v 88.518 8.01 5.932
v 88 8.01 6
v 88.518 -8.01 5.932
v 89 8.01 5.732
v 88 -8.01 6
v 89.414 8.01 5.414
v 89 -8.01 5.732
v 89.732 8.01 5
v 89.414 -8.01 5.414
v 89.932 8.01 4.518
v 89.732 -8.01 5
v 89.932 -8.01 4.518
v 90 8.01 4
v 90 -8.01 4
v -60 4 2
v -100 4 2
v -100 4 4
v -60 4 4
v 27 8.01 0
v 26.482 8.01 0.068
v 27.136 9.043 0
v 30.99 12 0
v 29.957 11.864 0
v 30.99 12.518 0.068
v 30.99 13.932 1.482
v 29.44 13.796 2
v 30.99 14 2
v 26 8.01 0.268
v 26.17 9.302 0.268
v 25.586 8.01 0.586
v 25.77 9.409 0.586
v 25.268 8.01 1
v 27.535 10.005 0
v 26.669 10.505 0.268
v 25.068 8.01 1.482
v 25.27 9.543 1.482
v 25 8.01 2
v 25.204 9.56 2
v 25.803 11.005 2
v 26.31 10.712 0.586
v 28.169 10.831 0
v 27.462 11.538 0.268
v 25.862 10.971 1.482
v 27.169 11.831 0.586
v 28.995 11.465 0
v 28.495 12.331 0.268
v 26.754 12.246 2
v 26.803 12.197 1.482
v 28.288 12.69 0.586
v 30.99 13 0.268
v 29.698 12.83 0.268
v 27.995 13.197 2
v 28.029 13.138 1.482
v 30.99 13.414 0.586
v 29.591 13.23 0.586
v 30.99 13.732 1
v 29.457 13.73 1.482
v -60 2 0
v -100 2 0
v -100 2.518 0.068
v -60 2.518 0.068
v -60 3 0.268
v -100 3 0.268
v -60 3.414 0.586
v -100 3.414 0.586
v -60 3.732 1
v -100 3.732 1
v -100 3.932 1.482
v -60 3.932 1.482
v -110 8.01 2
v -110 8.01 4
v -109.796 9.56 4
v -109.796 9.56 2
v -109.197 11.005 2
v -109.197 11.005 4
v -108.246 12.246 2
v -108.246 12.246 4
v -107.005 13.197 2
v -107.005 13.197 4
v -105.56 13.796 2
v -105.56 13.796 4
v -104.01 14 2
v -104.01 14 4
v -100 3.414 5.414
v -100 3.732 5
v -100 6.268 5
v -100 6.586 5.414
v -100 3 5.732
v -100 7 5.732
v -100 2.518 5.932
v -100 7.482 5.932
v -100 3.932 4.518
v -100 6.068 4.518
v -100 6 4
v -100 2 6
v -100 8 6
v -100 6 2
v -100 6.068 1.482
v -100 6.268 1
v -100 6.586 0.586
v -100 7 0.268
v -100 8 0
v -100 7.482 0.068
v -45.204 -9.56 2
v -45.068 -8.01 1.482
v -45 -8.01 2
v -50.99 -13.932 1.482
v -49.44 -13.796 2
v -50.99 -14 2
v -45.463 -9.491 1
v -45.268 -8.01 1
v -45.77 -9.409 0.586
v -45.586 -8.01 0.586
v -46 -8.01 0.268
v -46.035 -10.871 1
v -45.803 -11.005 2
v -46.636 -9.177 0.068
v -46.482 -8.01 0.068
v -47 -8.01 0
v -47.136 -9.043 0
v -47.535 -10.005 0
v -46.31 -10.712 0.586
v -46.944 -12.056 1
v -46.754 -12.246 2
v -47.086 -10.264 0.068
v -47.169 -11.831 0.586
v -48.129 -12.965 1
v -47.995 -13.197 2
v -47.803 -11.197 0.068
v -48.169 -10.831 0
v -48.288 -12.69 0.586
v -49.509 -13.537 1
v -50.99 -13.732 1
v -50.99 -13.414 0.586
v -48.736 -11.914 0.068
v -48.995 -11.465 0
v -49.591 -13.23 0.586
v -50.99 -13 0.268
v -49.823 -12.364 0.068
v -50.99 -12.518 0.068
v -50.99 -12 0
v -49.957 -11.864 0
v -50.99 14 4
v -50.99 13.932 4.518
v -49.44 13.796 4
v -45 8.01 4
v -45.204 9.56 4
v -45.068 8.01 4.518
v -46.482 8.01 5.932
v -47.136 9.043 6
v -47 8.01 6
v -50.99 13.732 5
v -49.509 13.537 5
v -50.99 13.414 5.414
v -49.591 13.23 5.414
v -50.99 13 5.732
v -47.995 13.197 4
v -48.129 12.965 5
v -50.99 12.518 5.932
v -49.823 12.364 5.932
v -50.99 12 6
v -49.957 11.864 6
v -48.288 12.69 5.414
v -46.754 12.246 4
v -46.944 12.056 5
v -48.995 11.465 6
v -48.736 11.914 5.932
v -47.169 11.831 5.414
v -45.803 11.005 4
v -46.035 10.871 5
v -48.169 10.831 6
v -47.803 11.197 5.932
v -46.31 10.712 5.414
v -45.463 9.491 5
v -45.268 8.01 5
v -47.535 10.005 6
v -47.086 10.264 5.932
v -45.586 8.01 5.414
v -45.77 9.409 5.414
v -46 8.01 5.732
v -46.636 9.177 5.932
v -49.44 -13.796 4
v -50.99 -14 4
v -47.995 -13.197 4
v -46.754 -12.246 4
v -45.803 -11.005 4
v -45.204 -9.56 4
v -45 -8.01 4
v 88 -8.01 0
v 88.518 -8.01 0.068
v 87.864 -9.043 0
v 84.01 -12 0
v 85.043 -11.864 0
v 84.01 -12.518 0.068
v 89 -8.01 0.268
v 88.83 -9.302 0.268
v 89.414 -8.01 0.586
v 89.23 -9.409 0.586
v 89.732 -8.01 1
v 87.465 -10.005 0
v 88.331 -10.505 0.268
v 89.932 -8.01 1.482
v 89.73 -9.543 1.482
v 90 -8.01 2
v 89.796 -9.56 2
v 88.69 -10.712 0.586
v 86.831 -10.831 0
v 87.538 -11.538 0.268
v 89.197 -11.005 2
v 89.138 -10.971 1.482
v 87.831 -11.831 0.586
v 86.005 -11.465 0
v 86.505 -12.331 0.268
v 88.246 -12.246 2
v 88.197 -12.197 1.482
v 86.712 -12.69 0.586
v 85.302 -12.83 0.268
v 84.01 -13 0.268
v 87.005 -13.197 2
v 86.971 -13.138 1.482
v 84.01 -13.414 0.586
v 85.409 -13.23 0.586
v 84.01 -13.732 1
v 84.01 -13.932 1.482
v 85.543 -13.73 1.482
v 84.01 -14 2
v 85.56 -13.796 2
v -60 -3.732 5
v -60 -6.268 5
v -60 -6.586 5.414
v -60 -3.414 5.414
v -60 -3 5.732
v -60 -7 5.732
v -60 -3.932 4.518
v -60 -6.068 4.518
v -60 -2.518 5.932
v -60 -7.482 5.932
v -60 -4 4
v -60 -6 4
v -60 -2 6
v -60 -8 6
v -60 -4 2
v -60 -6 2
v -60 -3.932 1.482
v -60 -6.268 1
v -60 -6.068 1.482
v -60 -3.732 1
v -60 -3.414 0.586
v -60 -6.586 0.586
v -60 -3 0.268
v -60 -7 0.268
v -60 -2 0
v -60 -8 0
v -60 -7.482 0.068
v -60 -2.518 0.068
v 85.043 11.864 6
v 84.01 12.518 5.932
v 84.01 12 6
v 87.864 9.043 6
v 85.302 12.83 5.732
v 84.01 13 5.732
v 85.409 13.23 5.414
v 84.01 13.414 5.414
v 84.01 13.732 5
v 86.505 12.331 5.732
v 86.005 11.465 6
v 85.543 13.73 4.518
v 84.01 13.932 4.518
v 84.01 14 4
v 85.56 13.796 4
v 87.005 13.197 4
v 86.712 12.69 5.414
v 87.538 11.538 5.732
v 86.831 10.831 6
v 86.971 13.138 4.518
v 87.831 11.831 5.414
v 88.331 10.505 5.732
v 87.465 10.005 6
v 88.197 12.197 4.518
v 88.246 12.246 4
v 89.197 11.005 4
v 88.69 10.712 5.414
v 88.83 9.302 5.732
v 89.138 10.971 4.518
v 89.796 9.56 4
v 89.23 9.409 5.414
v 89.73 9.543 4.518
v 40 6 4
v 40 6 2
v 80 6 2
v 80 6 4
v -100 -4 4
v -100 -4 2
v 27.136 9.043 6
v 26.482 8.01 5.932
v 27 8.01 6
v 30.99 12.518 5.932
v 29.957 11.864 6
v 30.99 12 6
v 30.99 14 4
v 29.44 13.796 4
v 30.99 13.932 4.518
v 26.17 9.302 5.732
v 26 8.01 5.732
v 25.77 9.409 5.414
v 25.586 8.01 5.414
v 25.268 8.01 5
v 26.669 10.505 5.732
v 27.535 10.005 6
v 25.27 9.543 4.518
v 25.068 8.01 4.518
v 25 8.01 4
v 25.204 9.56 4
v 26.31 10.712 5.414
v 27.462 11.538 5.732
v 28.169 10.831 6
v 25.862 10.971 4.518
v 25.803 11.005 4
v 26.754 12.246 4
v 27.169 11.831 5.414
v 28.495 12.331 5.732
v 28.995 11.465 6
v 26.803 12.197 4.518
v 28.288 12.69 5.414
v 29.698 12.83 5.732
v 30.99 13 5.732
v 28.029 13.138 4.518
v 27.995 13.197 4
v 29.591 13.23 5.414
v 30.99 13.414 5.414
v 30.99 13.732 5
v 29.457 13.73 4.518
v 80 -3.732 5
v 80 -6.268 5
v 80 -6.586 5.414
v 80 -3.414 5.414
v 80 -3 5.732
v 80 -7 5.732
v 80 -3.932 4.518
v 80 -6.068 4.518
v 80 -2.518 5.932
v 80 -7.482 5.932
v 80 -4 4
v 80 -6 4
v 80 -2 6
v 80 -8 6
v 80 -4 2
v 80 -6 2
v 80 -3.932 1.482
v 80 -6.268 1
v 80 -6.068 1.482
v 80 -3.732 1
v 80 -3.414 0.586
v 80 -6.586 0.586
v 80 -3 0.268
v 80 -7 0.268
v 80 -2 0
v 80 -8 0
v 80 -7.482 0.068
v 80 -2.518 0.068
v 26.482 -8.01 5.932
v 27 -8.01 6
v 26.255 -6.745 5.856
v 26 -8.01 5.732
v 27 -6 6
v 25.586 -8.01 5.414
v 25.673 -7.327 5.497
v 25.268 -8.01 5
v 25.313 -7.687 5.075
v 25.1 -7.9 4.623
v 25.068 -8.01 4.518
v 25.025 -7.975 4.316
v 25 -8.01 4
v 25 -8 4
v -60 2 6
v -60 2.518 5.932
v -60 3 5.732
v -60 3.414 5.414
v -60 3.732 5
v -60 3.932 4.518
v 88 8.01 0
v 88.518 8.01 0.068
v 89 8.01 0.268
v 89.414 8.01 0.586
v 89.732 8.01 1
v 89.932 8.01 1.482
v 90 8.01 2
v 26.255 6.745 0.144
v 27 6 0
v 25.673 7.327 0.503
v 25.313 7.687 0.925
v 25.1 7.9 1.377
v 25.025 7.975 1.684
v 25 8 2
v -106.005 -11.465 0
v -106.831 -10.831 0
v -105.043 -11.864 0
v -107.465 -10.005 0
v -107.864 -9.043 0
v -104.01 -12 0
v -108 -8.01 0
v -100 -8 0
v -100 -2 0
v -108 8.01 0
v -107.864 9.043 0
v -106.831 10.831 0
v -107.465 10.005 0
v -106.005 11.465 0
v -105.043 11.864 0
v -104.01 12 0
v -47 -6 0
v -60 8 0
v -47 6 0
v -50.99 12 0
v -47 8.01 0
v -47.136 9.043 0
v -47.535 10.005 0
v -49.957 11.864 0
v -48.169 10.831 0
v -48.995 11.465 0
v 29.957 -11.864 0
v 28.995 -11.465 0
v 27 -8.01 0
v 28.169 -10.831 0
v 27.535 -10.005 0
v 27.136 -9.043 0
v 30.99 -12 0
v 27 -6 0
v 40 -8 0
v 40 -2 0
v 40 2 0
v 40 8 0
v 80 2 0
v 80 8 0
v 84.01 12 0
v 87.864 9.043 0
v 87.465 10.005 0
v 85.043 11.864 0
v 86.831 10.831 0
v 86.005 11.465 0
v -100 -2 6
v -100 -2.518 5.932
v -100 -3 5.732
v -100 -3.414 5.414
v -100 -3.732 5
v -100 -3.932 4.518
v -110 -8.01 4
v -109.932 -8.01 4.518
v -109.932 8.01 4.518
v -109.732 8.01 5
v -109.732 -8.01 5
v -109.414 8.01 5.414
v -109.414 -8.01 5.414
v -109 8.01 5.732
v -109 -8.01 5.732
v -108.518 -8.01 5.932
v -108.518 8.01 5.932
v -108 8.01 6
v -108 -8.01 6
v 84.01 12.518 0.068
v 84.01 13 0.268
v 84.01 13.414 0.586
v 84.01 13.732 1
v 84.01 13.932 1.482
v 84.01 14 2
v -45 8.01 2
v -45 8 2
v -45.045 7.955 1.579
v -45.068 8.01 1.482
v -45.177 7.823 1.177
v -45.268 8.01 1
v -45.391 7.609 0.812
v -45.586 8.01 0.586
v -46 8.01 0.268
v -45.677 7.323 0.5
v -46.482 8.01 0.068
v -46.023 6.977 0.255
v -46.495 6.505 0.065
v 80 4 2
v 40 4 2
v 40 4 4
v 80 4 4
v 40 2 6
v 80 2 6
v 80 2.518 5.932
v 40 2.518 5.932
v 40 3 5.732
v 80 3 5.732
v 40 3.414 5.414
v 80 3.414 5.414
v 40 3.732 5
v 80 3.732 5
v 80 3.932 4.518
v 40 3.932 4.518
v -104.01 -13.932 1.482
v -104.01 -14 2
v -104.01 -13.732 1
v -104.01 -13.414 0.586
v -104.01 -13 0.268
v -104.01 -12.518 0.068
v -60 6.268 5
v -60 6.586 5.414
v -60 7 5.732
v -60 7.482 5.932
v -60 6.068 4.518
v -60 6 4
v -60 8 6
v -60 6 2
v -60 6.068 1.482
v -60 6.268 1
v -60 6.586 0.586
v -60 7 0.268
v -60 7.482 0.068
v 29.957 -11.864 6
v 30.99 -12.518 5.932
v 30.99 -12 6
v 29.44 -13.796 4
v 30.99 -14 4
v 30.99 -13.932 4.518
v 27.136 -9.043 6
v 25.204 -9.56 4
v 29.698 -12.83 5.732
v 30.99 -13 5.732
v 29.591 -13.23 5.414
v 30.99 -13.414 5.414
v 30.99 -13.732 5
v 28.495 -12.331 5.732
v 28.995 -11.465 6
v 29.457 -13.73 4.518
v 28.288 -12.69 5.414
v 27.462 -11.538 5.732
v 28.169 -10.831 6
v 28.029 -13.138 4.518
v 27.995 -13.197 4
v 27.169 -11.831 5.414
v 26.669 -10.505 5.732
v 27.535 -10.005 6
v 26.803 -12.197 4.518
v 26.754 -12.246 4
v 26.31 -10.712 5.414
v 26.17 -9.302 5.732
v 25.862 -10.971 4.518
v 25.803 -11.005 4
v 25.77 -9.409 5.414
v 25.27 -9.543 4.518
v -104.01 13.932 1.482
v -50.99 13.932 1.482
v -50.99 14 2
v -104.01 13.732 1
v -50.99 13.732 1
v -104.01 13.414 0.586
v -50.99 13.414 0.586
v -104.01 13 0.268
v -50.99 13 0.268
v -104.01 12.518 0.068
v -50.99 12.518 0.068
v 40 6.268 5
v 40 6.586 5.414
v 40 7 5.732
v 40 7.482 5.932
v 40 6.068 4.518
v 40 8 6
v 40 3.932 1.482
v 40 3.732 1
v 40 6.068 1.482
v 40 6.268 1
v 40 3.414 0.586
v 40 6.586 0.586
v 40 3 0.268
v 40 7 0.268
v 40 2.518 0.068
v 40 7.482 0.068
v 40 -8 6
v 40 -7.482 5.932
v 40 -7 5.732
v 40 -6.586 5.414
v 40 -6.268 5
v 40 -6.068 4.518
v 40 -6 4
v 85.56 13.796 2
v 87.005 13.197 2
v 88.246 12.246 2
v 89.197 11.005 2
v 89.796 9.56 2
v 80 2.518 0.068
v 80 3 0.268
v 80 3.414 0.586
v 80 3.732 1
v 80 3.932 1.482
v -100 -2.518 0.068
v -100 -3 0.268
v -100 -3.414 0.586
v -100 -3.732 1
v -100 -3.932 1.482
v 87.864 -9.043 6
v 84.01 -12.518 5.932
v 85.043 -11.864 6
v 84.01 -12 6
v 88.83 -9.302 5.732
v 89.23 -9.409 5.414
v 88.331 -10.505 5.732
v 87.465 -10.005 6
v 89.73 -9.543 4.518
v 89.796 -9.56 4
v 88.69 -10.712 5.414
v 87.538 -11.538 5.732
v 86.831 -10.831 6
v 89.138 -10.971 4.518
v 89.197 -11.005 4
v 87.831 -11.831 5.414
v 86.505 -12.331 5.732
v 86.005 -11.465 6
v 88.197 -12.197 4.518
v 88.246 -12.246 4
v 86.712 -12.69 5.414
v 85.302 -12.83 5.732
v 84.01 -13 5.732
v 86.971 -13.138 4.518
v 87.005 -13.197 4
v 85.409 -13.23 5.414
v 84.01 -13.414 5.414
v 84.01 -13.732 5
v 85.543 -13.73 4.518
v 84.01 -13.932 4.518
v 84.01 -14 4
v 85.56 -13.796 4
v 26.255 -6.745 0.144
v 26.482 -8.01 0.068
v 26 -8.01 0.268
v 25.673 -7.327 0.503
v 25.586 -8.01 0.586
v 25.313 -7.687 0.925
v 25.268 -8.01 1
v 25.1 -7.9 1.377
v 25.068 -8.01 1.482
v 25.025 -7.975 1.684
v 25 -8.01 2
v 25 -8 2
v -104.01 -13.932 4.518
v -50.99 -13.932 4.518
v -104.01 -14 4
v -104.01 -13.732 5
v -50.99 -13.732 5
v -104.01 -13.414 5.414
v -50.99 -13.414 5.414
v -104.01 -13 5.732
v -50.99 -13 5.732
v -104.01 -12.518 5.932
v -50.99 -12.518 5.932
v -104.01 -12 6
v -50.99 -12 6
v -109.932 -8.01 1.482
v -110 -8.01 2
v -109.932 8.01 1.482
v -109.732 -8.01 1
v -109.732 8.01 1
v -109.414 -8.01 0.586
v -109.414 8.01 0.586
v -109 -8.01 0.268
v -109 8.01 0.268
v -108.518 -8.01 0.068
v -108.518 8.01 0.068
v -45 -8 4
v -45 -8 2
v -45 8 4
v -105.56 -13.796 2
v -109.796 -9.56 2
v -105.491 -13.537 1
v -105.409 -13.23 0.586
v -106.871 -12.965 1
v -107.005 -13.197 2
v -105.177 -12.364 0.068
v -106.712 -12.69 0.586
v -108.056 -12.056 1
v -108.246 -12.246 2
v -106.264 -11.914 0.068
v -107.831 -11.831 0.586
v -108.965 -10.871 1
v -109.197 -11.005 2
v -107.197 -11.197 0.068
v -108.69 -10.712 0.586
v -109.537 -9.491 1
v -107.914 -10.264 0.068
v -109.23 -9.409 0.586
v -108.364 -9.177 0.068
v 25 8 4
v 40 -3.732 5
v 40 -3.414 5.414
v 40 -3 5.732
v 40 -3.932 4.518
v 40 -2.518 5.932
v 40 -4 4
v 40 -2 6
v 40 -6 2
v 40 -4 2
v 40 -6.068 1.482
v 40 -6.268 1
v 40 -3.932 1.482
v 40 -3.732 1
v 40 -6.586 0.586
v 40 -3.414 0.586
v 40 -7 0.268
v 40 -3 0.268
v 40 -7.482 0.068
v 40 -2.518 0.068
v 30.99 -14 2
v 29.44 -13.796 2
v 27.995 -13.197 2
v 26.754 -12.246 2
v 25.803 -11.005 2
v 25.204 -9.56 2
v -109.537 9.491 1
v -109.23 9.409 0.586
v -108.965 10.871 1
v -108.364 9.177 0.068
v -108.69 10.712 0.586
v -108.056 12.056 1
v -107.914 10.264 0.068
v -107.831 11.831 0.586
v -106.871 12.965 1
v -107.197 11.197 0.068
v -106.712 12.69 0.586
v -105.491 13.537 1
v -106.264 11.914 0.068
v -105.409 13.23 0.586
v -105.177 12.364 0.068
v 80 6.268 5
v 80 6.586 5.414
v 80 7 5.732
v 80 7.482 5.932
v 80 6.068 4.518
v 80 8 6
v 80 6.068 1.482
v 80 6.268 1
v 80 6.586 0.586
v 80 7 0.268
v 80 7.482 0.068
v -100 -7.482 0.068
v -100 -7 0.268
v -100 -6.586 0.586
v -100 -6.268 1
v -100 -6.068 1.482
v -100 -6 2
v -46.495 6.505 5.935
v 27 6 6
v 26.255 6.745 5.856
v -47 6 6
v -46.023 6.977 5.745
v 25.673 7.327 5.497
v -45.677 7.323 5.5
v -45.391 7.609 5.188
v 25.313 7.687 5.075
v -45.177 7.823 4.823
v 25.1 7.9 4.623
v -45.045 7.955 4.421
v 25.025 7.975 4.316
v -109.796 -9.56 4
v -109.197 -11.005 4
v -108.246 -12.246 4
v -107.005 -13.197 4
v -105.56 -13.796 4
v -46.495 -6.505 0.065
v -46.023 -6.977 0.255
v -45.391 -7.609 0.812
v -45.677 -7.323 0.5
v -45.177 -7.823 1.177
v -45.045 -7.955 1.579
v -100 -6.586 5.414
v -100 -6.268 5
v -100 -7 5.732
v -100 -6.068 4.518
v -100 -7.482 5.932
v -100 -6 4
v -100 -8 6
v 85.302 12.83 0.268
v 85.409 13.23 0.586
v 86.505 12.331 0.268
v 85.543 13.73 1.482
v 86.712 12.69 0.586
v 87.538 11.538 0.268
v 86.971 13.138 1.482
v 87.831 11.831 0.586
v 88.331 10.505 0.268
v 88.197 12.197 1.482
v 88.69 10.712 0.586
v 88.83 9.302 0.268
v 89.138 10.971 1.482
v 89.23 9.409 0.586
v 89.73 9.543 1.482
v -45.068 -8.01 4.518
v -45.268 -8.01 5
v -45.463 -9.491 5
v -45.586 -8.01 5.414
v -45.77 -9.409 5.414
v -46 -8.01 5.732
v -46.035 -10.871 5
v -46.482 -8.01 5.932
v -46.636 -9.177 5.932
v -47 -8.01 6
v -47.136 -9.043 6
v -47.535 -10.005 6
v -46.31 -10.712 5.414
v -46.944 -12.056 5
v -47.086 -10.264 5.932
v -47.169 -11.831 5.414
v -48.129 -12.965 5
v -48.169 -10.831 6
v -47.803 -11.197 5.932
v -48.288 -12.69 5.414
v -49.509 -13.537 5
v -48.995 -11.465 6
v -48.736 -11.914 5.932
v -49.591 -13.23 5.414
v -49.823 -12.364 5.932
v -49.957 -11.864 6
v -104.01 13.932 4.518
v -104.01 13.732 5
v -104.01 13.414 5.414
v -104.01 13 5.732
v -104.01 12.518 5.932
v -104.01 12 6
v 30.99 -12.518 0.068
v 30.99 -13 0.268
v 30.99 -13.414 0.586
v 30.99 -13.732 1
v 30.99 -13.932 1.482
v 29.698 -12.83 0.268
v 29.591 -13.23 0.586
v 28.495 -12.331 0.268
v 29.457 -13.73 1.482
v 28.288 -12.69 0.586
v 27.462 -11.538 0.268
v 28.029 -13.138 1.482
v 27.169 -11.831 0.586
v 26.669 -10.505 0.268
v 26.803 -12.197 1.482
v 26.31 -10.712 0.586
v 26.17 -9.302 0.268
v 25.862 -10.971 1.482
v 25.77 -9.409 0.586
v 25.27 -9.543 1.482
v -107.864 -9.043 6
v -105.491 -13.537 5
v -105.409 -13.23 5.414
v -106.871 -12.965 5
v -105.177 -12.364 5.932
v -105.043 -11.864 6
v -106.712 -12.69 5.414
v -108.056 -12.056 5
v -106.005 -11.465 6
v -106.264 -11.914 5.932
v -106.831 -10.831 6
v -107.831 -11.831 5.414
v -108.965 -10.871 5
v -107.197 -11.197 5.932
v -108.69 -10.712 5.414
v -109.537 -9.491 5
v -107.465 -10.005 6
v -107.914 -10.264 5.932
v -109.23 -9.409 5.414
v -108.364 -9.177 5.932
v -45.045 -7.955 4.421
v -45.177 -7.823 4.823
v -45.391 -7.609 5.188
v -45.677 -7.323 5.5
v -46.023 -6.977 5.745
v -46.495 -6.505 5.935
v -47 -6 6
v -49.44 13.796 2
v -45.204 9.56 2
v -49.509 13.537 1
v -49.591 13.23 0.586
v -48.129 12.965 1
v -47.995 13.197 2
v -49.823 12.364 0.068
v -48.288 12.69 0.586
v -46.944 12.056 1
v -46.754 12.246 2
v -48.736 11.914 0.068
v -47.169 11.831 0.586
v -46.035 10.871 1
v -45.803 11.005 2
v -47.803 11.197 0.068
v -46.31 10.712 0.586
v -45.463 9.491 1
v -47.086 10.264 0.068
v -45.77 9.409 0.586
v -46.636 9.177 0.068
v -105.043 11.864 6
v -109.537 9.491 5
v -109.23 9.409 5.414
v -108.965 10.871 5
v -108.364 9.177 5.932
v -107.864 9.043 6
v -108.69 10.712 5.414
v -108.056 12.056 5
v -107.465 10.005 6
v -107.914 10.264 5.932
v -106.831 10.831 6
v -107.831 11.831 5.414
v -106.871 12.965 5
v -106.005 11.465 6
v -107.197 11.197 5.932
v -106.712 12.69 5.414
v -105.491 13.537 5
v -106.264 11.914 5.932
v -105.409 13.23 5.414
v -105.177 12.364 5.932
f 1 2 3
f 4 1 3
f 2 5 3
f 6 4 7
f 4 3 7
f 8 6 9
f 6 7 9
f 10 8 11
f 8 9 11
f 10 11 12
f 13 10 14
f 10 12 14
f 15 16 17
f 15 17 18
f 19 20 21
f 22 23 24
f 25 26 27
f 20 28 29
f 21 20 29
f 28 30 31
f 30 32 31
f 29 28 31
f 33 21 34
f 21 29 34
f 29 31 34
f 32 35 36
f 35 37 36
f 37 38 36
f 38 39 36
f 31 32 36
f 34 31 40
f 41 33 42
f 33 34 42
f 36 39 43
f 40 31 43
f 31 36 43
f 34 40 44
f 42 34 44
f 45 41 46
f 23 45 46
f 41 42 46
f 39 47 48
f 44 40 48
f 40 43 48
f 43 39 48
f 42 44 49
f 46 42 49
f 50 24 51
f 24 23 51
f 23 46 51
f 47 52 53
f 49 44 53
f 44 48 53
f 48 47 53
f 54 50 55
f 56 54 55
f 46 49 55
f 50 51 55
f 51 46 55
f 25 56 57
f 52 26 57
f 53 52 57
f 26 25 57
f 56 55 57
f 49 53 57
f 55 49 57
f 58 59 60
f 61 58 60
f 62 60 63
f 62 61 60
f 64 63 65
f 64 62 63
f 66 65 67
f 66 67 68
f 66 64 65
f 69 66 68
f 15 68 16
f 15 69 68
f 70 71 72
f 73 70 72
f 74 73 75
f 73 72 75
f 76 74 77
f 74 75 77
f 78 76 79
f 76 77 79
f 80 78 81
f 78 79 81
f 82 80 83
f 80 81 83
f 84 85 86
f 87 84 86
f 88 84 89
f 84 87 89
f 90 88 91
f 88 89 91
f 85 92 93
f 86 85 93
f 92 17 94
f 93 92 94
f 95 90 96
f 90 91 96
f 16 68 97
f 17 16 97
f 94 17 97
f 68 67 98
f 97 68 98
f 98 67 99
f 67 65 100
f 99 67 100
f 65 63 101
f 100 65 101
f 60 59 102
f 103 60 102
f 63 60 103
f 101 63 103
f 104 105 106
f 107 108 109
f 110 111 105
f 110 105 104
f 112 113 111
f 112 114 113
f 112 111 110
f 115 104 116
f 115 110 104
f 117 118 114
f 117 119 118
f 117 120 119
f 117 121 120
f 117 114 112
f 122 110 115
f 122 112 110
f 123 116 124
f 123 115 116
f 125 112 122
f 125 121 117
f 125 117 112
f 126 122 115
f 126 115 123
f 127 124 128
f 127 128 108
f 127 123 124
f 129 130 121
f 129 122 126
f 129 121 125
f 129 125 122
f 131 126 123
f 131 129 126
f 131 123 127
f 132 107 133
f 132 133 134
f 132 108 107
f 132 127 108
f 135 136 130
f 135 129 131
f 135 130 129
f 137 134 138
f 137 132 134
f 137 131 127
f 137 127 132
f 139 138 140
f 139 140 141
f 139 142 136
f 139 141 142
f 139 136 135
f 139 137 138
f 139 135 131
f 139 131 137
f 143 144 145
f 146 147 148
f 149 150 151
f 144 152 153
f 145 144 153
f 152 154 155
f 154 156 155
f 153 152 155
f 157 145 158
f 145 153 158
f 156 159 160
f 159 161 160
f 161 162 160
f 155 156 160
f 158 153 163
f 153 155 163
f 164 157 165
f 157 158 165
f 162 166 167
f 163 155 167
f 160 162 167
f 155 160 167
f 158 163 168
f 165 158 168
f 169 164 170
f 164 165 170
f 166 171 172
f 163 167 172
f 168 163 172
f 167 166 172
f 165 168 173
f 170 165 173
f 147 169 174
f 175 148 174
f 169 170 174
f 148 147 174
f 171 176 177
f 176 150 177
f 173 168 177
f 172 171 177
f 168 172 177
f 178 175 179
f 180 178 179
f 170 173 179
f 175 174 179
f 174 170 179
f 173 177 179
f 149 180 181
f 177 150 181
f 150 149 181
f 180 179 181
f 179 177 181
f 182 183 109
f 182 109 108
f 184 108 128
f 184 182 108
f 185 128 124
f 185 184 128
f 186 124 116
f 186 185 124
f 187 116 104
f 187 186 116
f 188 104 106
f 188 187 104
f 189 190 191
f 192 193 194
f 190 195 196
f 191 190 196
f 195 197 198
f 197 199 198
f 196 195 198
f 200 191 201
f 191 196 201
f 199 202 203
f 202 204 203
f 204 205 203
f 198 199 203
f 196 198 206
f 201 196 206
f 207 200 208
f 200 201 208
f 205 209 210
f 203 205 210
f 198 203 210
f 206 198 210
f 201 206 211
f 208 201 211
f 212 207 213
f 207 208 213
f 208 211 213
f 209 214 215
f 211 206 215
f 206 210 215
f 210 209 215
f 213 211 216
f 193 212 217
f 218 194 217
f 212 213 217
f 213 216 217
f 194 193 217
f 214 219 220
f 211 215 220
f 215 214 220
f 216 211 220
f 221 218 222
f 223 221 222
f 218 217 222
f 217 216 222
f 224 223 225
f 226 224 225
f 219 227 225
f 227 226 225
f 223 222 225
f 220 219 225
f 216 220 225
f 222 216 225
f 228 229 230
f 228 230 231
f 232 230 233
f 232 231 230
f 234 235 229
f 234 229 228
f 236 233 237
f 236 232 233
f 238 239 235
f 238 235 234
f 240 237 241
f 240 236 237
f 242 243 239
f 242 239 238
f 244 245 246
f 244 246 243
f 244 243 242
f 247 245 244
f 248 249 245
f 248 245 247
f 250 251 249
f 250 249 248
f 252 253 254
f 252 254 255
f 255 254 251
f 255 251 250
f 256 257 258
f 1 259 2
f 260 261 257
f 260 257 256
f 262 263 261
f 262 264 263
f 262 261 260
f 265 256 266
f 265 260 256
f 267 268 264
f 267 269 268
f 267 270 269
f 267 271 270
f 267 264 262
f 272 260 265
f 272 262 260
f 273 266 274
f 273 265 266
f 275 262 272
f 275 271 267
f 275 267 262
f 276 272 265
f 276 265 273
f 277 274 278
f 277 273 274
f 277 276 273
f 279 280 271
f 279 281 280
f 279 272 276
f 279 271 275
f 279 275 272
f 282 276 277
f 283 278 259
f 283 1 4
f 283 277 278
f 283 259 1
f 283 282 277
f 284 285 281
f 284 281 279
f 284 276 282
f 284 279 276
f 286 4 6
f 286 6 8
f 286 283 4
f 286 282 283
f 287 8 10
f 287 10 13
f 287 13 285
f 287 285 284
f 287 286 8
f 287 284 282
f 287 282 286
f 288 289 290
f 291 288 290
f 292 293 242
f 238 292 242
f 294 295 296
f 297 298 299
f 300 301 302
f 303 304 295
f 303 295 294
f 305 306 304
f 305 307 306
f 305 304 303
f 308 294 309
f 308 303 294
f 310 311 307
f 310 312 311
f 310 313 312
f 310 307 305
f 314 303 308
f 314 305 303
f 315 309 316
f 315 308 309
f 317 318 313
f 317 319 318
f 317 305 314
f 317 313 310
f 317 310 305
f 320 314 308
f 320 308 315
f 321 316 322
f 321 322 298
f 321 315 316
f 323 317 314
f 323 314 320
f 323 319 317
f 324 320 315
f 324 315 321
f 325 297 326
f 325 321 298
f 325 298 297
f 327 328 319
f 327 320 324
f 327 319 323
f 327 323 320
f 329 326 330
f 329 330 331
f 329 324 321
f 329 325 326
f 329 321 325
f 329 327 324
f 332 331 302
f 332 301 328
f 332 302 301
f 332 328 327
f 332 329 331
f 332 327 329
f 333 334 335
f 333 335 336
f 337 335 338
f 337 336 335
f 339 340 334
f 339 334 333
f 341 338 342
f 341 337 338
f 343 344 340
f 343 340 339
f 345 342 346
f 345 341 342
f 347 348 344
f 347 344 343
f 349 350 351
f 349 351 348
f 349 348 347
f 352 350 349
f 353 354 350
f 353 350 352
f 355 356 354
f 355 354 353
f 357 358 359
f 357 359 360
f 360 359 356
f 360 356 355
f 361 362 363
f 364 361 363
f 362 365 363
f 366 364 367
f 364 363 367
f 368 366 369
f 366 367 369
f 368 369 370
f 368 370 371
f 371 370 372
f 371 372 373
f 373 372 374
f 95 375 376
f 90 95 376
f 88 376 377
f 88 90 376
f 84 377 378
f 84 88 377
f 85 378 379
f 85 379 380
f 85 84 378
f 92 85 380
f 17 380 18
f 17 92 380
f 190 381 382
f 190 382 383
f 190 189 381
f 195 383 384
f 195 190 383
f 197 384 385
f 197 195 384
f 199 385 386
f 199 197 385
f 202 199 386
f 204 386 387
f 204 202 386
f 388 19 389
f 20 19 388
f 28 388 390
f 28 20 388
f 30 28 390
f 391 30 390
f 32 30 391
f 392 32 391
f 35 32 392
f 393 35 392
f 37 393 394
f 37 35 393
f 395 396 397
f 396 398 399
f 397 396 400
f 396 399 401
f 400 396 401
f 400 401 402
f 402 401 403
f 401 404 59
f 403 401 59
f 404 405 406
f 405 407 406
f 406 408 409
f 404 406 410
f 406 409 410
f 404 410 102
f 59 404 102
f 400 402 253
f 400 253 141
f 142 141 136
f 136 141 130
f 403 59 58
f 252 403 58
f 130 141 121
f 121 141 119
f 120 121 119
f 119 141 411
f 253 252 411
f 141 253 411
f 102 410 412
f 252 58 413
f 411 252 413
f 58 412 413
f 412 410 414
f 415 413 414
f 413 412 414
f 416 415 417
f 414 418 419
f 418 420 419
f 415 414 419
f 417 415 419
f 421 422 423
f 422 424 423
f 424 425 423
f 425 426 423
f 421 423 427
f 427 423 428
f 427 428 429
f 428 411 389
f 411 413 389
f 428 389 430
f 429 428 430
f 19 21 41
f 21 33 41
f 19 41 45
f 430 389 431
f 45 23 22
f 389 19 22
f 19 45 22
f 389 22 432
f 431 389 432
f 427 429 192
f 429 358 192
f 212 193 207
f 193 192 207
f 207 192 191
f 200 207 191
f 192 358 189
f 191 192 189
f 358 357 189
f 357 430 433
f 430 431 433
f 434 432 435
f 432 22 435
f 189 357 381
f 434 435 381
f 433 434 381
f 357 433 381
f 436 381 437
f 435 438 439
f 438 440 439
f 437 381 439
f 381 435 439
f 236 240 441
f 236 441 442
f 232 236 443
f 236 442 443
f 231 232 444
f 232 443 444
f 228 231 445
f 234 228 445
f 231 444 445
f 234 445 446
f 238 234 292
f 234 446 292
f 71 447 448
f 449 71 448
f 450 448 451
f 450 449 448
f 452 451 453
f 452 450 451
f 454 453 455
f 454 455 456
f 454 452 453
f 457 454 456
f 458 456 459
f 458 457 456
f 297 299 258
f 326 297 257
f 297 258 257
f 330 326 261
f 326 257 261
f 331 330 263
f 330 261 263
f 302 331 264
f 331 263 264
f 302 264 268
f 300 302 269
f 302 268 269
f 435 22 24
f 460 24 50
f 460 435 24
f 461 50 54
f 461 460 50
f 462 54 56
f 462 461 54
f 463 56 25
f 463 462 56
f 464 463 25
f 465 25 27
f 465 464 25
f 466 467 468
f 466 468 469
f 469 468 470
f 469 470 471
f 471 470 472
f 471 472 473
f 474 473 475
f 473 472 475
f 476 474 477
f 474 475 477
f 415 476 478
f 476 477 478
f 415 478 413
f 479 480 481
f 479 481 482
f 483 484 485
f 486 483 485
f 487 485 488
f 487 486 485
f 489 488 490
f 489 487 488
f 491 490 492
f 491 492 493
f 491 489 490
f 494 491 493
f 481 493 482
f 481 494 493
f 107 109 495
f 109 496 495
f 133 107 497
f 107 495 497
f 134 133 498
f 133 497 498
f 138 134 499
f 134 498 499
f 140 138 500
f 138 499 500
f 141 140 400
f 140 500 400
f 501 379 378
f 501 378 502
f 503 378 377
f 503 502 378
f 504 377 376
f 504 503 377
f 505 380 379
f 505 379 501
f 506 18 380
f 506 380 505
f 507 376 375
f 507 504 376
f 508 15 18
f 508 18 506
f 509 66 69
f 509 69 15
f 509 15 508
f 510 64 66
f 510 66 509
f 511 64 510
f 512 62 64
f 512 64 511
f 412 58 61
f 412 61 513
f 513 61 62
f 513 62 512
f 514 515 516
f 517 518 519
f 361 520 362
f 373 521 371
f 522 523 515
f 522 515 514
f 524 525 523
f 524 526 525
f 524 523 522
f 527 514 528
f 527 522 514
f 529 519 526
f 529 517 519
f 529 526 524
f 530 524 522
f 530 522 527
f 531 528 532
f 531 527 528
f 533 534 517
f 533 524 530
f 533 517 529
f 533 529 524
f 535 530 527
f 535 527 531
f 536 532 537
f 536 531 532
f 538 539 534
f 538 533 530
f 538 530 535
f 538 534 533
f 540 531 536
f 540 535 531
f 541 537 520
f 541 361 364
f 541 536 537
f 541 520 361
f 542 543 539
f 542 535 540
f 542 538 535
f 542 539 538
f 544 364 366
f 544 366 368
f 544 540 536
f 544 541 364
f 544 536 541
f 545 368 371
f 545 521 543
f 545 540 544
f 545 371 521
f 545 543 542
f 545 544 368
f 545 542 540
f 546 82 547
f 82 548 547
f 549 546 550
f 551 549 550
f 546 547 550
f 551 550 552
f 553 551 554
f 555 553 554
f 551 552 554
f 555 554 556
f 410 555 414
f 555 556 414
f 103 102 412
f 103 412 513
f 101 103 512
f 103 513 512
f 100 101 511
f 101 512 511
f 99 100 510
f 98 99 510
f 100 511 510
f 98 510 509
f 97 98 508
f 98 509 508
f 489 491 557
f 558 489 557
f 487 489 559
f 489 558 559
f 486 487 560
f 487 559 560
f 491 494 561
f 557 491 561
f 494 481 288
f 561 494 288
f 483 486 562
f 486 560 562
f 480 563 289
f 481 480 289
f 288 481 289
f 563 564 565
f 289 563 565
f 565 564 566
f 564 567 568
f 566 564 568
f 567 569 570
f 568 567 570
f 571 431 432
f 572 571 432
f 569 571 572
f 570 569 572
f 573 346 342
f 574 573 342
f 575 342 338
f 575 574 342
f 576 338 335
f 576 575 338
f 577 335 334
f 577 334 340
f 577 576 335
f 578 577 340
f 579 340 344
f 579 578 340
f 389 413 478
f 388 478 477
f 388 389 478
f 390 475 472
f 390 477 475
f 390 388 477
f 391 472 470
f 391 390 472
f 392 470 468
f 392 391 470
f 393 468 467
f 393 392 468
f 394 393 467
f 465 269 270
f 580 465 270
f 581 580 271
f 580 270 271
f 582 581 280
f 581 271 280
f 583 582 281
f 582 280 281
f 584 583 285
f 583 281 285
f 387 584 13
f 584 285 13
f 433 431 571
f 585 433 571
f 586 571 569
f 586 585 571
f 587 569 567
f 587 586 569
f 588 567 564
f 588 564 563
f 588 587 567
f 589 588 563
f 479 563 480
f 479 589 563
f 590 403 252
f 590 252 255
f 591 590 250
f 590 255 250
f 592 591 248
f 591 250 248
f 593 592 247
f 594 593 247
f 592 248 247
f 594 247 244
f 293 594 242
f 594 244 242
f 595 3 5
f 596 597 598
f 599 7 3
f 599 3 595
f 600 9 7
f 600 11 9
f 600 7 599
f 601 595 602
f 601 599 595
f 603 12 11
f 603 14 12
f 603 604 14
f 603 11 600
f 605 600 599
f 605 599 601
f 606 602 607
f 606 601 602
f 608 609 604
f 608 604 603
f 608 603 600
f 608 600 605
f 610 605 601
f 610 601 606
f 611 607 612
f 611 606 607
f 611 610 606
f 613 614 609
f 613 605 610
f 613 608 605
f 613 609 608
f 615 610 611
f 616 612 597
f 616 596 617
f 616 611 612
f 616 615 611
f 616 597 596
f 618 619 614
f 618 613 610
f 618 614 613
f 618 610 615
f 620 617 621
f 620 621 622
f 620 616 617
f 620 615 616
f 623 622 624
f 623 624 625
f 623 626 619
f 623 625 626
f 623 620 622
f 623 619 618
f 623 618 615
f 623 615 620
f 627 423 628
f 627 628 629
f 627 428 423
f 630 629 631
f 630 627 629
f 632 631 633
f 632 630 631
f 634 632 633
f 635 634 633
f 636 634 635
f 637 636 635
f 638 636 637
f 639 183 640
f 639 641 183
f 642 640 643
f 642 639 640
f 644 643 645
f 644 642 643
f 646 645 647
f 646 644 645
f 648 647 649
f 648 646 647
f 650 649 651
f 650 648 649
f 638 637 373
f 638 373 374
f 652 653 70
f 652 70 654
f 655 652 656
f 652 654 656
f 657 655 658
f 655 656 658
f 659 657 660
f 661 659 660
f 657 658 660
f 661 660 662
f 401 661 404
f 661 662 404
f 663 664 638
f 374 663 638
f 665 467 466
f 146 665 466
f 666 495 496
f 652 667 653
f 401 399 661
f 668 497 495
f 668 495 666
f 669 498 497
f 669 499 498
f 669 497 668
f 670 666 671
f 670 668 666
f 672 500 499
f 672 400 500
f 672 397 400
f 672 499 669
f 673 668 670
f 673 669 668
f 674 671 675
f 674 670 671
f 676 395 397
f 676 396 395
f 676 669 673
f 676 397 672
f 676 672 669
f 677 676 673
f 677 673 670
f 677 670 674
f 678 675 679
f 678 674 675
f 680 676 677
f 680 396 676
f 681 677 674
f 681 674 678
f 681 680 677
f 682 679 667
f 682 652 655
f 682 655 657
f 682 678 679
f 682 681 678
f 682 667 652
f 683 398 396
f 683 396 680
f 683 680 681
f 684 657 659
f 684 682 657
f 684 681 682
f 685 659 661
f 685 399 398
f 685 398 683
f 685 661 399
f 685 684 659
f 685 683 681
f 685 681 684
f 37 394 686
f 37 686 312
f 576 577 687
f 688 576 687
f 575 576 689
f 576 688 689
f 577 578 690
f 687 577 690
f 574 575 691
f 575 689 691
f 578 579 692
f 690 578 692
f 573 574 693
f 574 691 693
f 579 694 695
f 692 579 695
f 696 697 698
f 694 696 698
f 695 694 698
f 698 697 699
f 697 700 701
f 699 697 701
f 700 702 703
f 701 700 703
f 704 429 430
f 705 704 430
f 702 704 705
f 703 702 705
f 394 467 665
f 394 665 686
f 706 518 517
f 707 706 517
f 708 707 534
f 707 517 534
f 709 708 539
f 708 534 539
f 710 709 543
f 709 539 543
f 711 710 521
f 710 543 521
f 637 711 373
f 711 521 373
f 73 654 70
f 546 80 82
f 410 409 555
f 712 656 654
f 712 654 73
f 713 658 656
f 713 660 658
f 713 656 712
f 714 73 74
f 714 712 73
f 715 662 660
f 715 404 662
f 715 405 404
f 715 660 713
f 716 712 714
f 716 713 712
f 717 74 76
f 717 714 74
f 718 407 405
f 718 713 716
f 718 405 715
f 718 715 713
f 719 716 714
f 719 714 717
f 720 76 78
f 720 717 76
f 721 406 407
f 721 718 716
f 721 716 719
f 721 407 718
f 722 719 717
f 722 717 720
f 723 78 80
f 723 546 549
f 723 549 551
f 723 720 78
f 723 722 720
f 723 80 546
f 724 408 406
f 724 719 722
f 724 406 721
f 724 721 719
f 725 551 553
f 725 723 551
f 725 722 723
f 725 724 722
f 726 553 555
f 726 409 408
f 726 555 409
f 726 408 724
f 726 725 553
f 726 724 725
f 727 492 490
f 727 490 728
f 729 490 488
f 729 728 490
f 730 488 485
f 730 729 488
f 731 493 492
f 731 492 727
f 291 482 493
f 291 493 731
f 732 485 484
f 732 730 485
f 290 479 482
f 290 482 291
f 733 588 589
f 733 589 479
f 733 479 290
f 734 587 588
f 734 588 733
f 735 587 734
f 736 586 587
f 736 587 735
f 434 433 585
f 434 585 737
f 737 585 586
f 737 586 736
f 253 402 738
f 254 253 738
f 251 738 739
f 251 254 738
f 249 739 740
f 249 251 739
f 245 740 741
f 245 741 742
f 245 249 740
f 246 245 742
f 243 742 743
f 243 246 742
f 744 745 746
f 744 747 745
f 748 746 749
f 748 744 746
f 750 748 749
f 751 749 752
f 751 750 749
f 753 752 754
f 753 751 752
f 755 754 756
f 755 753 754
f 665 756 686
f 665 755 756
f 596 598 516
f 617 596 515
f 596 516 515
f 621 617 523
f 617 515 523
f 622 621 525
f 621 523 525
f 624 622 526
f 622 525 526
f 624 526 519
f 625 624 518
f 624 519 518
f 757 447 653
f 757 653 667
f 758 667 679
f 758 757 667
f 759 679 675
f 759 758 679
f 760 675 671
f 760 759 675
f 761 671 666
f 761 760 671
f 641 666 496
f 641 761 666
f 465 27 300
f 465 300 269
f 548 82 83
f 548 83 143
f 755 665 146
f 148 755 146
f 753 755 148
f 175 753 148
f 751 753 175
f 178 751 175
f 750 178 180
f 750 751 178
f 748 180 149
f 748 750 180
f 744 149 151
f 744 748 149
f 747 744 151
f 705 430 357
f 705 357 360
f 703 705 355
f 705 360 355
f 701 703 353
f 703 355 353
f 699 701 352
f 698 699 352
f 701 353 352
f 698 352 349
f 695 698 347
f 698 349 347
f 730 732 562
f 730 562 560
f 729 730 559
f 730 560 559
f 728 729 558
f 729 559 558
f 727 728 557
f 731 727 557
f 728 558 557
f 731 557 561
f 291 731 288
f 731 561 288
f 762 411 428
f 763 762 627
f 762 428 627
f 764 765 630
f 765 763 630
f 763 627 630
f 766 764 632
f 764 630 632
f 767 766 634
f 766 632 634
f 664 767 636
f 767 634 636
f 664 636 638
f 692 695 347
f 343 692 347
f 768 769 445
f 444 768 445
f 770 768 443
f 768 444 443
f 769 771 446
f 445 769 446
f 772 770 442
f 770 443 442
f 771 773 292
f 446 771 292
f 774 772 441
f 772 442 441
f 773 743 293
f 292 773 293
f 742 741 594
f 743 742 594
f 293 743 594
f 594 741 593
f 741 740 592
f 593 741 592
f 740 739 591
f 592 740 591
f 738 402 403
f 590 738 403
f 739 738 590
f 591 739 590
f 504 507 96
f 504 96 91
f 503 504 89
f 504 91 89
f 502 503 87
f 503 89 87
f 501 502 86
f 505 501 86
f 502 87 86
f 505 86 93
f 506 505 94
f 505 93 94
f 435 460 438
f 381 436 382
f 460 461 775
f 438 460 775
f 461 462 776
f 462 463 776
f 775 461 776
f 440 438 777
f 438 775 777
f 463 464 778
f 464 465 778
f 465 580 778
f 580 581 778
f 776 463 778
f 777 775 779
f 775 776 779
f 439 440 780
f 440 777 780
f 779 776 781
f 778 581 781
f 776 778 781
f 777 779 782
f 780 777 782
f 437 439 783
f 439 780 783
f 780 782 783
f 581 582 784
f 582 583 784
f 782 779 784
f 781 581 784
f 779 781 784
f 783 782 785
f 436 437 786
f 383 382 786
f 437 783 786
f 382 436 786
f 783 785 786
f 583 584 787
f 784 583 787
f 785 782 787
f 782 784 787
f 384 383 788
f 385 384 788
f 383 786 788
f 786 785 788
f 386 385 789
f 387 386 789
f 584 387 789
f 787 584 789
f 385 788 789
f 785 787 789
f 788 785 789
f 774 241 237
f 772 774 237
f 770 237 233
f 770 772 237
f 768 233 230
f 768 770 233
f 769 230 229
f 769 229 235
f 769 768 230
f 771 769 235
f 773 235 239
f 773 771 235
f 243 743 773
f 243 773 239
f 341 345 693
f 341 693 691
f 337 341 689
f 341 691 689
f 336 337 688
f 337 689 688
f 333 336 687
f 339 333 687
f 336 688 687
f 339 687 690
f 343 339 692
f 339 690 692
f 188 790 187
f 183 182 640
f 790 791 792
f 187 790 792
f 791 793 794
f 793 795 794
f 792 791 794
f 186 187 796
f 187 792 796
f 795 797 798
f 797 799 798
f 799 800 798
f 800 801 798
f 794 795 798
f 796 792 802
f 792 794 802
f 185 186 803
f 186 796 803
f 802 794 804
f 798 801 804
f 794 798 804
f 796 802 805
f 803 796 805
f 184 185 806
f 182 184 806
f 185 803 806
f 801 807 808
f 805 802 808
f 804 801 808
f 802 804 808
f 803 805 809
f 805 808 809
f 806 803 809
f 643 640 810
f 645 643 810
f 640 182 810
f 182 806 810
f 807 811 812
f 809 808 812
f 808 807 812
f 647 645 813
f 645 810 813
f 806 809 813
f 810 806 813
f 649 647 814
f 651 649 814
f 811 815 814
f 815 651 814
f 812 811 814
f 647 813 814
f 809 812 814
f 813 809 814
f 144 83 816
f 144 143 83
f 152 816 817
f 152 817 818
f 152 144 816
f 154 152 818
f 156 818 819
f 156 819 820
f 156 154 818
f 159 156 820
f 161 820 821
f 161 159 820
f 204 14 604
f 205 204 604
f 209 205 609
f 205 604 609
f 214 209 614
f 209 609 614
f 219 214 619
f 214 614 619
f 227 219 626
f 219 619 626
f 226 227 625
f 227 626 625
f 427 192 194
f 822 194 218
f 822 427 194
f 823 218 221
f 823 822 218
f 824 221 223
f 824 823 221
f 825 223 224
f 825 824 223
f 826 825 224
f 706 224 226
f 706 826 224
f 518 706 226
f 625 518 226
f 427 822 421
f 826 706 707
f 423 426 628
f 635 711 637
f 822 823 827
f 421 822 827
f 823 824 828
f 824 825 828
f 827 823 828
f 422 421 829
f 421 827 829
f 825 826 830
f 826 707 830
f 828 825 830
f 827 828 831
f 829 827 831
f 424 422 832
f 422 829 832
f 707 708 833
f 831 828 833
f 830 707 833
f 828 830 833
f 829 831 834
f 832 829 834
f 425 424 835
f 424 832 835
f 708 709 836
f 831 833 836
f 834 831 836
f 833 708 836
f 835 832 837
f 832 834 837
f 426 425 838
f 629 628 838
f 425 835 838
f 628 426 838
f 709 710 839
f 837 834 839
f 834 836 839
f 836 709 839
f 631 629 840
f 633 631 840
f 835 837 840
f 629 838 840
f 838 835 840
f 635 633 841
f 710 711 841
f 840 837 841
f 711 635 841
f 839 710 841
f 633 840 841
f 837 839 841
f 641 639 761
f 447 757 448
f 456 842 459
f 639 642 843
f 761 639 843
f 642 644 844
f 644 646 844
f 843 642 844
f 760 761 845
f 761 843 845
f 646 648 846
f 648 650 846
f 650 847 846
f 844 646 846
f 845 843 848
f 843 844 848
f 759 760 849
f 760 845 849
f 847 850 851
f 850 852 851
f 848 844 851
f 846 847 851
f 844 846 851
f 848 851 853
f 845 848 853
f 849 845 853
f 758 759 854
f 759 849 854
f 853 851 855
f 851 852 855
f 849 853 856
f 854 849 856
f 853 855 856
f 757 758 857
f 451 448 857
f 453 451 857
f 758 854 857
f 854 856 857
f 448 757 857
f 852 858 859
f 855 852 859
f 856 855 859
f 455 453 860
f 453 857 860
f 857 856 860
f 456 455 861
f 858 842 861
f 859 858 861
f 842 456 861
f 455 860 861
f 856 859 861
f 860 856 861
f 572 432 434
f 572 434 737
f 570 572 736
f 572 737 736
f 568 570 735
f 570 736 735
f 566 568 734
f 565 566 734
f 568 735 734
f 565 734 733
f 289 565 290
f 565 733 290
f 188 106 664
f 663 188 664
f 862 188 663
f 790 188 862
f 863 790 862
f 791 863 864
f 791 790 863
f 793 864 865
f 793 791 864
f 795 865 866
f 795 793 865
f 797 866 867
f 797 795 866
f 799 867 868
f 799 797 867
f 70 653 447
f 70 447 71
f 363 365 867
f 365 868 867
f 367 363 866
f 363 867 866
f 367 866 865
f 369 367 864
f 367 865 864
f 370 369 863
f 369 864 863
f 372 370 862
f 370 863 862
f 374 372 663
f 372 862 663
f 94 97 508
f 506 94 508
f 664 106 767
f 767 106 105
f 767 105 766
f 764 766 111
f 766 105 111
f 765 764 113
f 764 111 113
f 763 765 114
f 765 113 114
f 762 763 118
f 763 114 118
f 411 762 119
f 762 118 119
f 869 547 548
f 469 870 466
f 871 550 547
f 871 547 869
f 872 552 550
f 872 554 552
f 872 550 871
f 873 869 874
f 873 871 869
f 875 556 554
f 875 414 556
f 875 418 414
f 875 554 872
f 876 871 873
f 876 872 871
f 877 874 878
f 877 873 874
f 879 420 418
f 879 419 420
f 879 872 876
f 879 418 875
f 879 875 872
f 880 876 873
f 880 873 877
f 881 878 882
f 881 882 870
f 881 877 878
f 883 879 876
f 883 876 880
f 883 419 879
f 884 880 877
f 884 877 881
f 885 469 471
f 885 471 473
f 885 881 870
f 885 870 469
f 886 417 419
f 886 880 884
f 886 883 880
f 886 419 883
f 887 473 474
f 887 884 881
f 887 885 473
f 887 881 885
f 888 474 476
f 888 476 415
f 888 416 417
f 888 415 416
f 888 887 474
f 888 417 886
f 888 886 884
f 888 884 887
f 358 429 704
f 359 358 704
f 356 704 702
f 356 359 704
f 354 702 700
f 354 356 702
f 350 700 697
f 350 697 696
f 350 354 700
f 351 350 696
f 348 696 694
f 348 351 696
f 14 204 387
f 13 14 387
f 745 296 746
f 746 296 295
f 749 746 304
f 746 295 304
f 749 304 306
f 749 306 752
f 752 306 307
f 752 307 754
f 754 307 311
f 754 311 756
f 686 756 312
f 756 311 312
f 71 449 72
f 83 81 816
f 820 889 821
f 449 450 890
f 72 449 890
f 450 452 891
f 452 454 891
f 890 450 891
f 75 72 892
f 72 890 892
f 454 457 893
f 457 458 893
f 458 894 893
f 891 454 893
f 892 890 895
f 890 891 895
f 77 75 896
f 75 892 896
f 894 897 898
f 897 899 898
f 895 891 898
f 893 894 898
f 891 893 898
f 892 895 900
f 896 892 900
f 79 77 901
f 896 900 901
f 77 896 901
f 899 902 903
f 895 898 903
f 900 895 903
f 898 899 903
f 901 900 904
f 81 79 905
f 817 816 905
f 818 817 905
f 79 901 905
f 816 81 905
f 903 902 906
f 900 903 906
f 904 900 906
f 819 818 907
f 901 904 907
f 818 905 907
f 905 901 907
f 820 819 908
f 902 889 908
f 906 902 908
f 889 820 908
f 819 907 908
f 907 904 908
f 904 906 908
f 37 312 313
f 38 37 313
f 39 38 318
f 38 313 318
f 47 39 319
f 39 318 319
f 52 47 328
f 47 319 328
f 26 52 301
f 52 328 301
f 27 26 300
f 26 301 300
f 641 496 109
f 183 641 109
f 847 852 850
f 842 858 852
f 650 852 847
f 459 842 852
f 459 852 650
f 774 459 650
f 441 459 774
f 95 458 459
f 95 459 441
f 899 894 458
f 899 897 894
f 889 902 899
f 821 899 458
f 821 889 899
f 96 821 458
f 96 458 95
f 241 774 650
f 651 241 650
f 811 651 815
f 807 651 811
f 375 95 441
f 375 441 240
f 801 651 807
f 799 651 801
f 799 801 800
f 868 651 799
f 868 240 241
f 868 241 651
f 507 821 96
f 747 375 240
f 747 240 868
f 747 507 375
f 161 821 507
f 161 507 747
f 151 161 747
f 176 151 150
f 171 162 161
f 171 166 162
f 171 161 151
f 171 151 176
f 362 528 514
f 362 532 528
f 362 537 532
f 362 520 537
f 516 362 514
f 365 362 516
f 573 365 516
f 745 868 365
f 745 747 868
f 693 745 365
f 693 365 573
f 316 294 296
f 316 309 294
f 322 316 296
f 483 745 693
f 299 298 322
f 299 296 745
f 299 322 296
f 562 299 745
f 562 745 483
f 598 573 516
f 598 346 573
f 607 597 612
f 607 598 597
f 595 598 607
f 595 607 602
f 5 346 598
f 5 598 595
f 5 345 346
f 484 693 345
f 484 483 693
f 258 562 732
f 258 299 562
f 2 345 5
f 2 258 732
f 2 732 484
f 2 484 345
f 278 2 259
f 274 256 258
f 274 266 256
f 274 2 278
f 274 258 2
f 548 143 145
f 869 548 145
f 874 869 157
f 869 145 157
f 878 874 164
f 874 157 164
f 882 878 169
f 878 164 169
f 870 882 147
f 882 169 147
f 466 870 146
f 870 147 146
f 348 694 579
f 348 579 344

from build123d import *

# Parameters (mm, degrees)
BOX003_W     = 40
BOX003_H     = 2
BOX003_DEPTH = 10
BOX004_W     = 40
BOX004_H     = 2
BOX004_DEPTH = 10
BOX002_W     = 40
BOX002_H     = 2
BOX002_DEPTH = 10
BOX005_W     = 70
BOX005_H     = 6
BOX005_DEPTH = 10
BOX006_W     = 70
BOX006_H     = 6
BOX006_DEPTH = 10
BOX001_W     = 40
BOX001_H     = 2
BOX001_DEPTH = 10
BOX_W        = 200
BOX_H        = 28
BOX_DEPTH    = 6
FILLET_R     = 5.99
FILLET001_R  = 2


with BuildPart() as cube003:
    # Box003 → Box003 (new body)
    with BuildSketch(Plane(origin=(40, -6, 0), x_dir=(1, 0, 0), z_dir=(0, 0, 1))):
        with Locations((20, 1)):
            Rectangle(BOX003_W, BOX003_H)
    extrude(amount=BOX003_DEPTH)


with BuildPart() as cube004:
    # Box004 → Box004 (new body)
    with BuildSketch(Plane(origin=(40, 4, 0), x_dir=(1, 0, 0), z_dir=(0, 0, 1))):
        with Locations((20, 1)):
            Rectangle(BOX004_W, BOX004_H)
    extrude(amount=BOX004_DEPTH)


with BuildPart() as cube002:
    # Box002 → Box002 (new body)
    with BuildSketch(Plane(origin=(-100, 4, 0), x_dir=(1, 0, 0), z_dir=(0, 0, 1))):
        with Locations((20, 1)):
            Rectangle(BOX002_W, BOX002_H)
    extrude(amount=BOX002_DEPTH)


with BuildPart() as cube005:
    # Box005 → Box005 (new body)
    with BuildSketch(Plane(origin=(-45, -14, 0), x_dir=(1, 0, 0), z_dir=(0, 0, 1))):
        with Locations((35, 3)):
            Rectangle(BOX005_W, BOX005_H)
    extrude(amount=BOX005_DEPTH)


with BuildPart() as cube006:
    # Box006 → Box006 (new body)
    with BuildSketch(Plane(origin=(-45, 8, 0), x_dir=(1, 0, 0), z_dir=(0, 0, 1))):
        with Locations((35, 3)):
            Rectangle(BOX006_W, BOX006_H)
    extrude(amount=BOX006_DEPTH)


with BuildPart() as holes:
    # Box001 → Box001 (new body)
    with BuildSketch(Plane(origin=(-100, -6, 0), x_dir=(1, 0, 0), z_dir=(0, 0, 1))):
        with Locations((20, 1)):
            Rectangle(BOX001_W, BOX001_H)
    extrude(amount=BOX001_DEPTH)

    # Fusion: union Cube003, Cube004, Cube002, Cube005, Cube006
    add(cube003.part)
    add(cube004.part)
    add(cube002.part)
    add(cube005.part)
    add(cube006.part)


with BuildPart() as fillet001:
    # Box → Box (new body)
    with BuildSketch(Plane(origin=(-110, -14, 0), x_dir=(1, 0, 0), z_dir=(0, 0, 1))):
        with Locations((100, 14)):
            Rectangle(BOX_W, BOX_H)
    extrude(amount=BOX_DEPTH)

    # Cut: cut Holes
    add(holes.part, mode=Mode.SUBTRACT)

    # Fillet
    fillet_edges = [fillet001.edges().sort_by_distance(p)[0] for p in [
        (-110, -14, 3),
        (-110, 14, 3),
        (-45, -14, 3),
        (-45, 14, 3),
        (25, 14, 3),
        (90, 14, 3),
        (90, -14, 3),
        (25, -14, 3),
    ]]
    fillet(fillet_edges, radius=FILLET_R)

    # Fillet001
    fillet001_edges = [fillet001.edges().sort_by_distance(p)[0] for p in [
        (-110, 0, 6),
        (-110, 0, 0),
        (-77.5, 14, 6),
        (-108.24557, 12.24557, 6),
        (-46.75443, 12.24557, 6),
        (-108.24557, -12.24557, 6),
        (-10, 8, 6),
        (-77.5, -14, 6),
        (-46.75443, -12.24557, 6),
        (26.75443, 12.24557, 6),
        (57.5, 14, 6),
        (-10, -8, 6),
        (88.24557, 12.24557, 6),
        (90, 0, 6),
        (26.75443, -12.24557, 6),
        (88.24557, -12.24557, 6),
        (57.5, -14, 6),
        (-80, -6, 6),
        (-80, -4, 6),
        (-80, 4, 6),
        (-80, 6, 6),
        (60, 4, 6),
        (60, 6, 6),
        (60, -6, 6),
        (60, -4, 6),
        (-108.24557, -12.24557, 0),
        (-108.24557, 12.24557, 0),
        (-77.5, 14, 0),
        (-46.75443, 12.24557, 0),
        (-10, 8, 0),
        (-77.5, -14, 0),
        (-46.75443, -12.24557, 0),
        (26.75443, 12.24557, 0),
        (57.5, 14, 0),
        (-10, -8, 0),
        (88.24557, 12.24557, 0),
        (90, 0, 0),
        (26.75443, -12.24557, 0),
        (88.24557, -12.24557, 0),
        (57.5, -14, 0),
        (-80, -6, 0),
        (-80, -4, 0),
        (-80, 4, 0),
        (-80, 6, 0),
        (60, 4, 0),
        (60, 6, 0),
        (60, -6, 0),
        (60, -4, 0),
    ]]
    fillet(fillet001_edges, radius=FILLET001_R)


solid = fillet001.part
